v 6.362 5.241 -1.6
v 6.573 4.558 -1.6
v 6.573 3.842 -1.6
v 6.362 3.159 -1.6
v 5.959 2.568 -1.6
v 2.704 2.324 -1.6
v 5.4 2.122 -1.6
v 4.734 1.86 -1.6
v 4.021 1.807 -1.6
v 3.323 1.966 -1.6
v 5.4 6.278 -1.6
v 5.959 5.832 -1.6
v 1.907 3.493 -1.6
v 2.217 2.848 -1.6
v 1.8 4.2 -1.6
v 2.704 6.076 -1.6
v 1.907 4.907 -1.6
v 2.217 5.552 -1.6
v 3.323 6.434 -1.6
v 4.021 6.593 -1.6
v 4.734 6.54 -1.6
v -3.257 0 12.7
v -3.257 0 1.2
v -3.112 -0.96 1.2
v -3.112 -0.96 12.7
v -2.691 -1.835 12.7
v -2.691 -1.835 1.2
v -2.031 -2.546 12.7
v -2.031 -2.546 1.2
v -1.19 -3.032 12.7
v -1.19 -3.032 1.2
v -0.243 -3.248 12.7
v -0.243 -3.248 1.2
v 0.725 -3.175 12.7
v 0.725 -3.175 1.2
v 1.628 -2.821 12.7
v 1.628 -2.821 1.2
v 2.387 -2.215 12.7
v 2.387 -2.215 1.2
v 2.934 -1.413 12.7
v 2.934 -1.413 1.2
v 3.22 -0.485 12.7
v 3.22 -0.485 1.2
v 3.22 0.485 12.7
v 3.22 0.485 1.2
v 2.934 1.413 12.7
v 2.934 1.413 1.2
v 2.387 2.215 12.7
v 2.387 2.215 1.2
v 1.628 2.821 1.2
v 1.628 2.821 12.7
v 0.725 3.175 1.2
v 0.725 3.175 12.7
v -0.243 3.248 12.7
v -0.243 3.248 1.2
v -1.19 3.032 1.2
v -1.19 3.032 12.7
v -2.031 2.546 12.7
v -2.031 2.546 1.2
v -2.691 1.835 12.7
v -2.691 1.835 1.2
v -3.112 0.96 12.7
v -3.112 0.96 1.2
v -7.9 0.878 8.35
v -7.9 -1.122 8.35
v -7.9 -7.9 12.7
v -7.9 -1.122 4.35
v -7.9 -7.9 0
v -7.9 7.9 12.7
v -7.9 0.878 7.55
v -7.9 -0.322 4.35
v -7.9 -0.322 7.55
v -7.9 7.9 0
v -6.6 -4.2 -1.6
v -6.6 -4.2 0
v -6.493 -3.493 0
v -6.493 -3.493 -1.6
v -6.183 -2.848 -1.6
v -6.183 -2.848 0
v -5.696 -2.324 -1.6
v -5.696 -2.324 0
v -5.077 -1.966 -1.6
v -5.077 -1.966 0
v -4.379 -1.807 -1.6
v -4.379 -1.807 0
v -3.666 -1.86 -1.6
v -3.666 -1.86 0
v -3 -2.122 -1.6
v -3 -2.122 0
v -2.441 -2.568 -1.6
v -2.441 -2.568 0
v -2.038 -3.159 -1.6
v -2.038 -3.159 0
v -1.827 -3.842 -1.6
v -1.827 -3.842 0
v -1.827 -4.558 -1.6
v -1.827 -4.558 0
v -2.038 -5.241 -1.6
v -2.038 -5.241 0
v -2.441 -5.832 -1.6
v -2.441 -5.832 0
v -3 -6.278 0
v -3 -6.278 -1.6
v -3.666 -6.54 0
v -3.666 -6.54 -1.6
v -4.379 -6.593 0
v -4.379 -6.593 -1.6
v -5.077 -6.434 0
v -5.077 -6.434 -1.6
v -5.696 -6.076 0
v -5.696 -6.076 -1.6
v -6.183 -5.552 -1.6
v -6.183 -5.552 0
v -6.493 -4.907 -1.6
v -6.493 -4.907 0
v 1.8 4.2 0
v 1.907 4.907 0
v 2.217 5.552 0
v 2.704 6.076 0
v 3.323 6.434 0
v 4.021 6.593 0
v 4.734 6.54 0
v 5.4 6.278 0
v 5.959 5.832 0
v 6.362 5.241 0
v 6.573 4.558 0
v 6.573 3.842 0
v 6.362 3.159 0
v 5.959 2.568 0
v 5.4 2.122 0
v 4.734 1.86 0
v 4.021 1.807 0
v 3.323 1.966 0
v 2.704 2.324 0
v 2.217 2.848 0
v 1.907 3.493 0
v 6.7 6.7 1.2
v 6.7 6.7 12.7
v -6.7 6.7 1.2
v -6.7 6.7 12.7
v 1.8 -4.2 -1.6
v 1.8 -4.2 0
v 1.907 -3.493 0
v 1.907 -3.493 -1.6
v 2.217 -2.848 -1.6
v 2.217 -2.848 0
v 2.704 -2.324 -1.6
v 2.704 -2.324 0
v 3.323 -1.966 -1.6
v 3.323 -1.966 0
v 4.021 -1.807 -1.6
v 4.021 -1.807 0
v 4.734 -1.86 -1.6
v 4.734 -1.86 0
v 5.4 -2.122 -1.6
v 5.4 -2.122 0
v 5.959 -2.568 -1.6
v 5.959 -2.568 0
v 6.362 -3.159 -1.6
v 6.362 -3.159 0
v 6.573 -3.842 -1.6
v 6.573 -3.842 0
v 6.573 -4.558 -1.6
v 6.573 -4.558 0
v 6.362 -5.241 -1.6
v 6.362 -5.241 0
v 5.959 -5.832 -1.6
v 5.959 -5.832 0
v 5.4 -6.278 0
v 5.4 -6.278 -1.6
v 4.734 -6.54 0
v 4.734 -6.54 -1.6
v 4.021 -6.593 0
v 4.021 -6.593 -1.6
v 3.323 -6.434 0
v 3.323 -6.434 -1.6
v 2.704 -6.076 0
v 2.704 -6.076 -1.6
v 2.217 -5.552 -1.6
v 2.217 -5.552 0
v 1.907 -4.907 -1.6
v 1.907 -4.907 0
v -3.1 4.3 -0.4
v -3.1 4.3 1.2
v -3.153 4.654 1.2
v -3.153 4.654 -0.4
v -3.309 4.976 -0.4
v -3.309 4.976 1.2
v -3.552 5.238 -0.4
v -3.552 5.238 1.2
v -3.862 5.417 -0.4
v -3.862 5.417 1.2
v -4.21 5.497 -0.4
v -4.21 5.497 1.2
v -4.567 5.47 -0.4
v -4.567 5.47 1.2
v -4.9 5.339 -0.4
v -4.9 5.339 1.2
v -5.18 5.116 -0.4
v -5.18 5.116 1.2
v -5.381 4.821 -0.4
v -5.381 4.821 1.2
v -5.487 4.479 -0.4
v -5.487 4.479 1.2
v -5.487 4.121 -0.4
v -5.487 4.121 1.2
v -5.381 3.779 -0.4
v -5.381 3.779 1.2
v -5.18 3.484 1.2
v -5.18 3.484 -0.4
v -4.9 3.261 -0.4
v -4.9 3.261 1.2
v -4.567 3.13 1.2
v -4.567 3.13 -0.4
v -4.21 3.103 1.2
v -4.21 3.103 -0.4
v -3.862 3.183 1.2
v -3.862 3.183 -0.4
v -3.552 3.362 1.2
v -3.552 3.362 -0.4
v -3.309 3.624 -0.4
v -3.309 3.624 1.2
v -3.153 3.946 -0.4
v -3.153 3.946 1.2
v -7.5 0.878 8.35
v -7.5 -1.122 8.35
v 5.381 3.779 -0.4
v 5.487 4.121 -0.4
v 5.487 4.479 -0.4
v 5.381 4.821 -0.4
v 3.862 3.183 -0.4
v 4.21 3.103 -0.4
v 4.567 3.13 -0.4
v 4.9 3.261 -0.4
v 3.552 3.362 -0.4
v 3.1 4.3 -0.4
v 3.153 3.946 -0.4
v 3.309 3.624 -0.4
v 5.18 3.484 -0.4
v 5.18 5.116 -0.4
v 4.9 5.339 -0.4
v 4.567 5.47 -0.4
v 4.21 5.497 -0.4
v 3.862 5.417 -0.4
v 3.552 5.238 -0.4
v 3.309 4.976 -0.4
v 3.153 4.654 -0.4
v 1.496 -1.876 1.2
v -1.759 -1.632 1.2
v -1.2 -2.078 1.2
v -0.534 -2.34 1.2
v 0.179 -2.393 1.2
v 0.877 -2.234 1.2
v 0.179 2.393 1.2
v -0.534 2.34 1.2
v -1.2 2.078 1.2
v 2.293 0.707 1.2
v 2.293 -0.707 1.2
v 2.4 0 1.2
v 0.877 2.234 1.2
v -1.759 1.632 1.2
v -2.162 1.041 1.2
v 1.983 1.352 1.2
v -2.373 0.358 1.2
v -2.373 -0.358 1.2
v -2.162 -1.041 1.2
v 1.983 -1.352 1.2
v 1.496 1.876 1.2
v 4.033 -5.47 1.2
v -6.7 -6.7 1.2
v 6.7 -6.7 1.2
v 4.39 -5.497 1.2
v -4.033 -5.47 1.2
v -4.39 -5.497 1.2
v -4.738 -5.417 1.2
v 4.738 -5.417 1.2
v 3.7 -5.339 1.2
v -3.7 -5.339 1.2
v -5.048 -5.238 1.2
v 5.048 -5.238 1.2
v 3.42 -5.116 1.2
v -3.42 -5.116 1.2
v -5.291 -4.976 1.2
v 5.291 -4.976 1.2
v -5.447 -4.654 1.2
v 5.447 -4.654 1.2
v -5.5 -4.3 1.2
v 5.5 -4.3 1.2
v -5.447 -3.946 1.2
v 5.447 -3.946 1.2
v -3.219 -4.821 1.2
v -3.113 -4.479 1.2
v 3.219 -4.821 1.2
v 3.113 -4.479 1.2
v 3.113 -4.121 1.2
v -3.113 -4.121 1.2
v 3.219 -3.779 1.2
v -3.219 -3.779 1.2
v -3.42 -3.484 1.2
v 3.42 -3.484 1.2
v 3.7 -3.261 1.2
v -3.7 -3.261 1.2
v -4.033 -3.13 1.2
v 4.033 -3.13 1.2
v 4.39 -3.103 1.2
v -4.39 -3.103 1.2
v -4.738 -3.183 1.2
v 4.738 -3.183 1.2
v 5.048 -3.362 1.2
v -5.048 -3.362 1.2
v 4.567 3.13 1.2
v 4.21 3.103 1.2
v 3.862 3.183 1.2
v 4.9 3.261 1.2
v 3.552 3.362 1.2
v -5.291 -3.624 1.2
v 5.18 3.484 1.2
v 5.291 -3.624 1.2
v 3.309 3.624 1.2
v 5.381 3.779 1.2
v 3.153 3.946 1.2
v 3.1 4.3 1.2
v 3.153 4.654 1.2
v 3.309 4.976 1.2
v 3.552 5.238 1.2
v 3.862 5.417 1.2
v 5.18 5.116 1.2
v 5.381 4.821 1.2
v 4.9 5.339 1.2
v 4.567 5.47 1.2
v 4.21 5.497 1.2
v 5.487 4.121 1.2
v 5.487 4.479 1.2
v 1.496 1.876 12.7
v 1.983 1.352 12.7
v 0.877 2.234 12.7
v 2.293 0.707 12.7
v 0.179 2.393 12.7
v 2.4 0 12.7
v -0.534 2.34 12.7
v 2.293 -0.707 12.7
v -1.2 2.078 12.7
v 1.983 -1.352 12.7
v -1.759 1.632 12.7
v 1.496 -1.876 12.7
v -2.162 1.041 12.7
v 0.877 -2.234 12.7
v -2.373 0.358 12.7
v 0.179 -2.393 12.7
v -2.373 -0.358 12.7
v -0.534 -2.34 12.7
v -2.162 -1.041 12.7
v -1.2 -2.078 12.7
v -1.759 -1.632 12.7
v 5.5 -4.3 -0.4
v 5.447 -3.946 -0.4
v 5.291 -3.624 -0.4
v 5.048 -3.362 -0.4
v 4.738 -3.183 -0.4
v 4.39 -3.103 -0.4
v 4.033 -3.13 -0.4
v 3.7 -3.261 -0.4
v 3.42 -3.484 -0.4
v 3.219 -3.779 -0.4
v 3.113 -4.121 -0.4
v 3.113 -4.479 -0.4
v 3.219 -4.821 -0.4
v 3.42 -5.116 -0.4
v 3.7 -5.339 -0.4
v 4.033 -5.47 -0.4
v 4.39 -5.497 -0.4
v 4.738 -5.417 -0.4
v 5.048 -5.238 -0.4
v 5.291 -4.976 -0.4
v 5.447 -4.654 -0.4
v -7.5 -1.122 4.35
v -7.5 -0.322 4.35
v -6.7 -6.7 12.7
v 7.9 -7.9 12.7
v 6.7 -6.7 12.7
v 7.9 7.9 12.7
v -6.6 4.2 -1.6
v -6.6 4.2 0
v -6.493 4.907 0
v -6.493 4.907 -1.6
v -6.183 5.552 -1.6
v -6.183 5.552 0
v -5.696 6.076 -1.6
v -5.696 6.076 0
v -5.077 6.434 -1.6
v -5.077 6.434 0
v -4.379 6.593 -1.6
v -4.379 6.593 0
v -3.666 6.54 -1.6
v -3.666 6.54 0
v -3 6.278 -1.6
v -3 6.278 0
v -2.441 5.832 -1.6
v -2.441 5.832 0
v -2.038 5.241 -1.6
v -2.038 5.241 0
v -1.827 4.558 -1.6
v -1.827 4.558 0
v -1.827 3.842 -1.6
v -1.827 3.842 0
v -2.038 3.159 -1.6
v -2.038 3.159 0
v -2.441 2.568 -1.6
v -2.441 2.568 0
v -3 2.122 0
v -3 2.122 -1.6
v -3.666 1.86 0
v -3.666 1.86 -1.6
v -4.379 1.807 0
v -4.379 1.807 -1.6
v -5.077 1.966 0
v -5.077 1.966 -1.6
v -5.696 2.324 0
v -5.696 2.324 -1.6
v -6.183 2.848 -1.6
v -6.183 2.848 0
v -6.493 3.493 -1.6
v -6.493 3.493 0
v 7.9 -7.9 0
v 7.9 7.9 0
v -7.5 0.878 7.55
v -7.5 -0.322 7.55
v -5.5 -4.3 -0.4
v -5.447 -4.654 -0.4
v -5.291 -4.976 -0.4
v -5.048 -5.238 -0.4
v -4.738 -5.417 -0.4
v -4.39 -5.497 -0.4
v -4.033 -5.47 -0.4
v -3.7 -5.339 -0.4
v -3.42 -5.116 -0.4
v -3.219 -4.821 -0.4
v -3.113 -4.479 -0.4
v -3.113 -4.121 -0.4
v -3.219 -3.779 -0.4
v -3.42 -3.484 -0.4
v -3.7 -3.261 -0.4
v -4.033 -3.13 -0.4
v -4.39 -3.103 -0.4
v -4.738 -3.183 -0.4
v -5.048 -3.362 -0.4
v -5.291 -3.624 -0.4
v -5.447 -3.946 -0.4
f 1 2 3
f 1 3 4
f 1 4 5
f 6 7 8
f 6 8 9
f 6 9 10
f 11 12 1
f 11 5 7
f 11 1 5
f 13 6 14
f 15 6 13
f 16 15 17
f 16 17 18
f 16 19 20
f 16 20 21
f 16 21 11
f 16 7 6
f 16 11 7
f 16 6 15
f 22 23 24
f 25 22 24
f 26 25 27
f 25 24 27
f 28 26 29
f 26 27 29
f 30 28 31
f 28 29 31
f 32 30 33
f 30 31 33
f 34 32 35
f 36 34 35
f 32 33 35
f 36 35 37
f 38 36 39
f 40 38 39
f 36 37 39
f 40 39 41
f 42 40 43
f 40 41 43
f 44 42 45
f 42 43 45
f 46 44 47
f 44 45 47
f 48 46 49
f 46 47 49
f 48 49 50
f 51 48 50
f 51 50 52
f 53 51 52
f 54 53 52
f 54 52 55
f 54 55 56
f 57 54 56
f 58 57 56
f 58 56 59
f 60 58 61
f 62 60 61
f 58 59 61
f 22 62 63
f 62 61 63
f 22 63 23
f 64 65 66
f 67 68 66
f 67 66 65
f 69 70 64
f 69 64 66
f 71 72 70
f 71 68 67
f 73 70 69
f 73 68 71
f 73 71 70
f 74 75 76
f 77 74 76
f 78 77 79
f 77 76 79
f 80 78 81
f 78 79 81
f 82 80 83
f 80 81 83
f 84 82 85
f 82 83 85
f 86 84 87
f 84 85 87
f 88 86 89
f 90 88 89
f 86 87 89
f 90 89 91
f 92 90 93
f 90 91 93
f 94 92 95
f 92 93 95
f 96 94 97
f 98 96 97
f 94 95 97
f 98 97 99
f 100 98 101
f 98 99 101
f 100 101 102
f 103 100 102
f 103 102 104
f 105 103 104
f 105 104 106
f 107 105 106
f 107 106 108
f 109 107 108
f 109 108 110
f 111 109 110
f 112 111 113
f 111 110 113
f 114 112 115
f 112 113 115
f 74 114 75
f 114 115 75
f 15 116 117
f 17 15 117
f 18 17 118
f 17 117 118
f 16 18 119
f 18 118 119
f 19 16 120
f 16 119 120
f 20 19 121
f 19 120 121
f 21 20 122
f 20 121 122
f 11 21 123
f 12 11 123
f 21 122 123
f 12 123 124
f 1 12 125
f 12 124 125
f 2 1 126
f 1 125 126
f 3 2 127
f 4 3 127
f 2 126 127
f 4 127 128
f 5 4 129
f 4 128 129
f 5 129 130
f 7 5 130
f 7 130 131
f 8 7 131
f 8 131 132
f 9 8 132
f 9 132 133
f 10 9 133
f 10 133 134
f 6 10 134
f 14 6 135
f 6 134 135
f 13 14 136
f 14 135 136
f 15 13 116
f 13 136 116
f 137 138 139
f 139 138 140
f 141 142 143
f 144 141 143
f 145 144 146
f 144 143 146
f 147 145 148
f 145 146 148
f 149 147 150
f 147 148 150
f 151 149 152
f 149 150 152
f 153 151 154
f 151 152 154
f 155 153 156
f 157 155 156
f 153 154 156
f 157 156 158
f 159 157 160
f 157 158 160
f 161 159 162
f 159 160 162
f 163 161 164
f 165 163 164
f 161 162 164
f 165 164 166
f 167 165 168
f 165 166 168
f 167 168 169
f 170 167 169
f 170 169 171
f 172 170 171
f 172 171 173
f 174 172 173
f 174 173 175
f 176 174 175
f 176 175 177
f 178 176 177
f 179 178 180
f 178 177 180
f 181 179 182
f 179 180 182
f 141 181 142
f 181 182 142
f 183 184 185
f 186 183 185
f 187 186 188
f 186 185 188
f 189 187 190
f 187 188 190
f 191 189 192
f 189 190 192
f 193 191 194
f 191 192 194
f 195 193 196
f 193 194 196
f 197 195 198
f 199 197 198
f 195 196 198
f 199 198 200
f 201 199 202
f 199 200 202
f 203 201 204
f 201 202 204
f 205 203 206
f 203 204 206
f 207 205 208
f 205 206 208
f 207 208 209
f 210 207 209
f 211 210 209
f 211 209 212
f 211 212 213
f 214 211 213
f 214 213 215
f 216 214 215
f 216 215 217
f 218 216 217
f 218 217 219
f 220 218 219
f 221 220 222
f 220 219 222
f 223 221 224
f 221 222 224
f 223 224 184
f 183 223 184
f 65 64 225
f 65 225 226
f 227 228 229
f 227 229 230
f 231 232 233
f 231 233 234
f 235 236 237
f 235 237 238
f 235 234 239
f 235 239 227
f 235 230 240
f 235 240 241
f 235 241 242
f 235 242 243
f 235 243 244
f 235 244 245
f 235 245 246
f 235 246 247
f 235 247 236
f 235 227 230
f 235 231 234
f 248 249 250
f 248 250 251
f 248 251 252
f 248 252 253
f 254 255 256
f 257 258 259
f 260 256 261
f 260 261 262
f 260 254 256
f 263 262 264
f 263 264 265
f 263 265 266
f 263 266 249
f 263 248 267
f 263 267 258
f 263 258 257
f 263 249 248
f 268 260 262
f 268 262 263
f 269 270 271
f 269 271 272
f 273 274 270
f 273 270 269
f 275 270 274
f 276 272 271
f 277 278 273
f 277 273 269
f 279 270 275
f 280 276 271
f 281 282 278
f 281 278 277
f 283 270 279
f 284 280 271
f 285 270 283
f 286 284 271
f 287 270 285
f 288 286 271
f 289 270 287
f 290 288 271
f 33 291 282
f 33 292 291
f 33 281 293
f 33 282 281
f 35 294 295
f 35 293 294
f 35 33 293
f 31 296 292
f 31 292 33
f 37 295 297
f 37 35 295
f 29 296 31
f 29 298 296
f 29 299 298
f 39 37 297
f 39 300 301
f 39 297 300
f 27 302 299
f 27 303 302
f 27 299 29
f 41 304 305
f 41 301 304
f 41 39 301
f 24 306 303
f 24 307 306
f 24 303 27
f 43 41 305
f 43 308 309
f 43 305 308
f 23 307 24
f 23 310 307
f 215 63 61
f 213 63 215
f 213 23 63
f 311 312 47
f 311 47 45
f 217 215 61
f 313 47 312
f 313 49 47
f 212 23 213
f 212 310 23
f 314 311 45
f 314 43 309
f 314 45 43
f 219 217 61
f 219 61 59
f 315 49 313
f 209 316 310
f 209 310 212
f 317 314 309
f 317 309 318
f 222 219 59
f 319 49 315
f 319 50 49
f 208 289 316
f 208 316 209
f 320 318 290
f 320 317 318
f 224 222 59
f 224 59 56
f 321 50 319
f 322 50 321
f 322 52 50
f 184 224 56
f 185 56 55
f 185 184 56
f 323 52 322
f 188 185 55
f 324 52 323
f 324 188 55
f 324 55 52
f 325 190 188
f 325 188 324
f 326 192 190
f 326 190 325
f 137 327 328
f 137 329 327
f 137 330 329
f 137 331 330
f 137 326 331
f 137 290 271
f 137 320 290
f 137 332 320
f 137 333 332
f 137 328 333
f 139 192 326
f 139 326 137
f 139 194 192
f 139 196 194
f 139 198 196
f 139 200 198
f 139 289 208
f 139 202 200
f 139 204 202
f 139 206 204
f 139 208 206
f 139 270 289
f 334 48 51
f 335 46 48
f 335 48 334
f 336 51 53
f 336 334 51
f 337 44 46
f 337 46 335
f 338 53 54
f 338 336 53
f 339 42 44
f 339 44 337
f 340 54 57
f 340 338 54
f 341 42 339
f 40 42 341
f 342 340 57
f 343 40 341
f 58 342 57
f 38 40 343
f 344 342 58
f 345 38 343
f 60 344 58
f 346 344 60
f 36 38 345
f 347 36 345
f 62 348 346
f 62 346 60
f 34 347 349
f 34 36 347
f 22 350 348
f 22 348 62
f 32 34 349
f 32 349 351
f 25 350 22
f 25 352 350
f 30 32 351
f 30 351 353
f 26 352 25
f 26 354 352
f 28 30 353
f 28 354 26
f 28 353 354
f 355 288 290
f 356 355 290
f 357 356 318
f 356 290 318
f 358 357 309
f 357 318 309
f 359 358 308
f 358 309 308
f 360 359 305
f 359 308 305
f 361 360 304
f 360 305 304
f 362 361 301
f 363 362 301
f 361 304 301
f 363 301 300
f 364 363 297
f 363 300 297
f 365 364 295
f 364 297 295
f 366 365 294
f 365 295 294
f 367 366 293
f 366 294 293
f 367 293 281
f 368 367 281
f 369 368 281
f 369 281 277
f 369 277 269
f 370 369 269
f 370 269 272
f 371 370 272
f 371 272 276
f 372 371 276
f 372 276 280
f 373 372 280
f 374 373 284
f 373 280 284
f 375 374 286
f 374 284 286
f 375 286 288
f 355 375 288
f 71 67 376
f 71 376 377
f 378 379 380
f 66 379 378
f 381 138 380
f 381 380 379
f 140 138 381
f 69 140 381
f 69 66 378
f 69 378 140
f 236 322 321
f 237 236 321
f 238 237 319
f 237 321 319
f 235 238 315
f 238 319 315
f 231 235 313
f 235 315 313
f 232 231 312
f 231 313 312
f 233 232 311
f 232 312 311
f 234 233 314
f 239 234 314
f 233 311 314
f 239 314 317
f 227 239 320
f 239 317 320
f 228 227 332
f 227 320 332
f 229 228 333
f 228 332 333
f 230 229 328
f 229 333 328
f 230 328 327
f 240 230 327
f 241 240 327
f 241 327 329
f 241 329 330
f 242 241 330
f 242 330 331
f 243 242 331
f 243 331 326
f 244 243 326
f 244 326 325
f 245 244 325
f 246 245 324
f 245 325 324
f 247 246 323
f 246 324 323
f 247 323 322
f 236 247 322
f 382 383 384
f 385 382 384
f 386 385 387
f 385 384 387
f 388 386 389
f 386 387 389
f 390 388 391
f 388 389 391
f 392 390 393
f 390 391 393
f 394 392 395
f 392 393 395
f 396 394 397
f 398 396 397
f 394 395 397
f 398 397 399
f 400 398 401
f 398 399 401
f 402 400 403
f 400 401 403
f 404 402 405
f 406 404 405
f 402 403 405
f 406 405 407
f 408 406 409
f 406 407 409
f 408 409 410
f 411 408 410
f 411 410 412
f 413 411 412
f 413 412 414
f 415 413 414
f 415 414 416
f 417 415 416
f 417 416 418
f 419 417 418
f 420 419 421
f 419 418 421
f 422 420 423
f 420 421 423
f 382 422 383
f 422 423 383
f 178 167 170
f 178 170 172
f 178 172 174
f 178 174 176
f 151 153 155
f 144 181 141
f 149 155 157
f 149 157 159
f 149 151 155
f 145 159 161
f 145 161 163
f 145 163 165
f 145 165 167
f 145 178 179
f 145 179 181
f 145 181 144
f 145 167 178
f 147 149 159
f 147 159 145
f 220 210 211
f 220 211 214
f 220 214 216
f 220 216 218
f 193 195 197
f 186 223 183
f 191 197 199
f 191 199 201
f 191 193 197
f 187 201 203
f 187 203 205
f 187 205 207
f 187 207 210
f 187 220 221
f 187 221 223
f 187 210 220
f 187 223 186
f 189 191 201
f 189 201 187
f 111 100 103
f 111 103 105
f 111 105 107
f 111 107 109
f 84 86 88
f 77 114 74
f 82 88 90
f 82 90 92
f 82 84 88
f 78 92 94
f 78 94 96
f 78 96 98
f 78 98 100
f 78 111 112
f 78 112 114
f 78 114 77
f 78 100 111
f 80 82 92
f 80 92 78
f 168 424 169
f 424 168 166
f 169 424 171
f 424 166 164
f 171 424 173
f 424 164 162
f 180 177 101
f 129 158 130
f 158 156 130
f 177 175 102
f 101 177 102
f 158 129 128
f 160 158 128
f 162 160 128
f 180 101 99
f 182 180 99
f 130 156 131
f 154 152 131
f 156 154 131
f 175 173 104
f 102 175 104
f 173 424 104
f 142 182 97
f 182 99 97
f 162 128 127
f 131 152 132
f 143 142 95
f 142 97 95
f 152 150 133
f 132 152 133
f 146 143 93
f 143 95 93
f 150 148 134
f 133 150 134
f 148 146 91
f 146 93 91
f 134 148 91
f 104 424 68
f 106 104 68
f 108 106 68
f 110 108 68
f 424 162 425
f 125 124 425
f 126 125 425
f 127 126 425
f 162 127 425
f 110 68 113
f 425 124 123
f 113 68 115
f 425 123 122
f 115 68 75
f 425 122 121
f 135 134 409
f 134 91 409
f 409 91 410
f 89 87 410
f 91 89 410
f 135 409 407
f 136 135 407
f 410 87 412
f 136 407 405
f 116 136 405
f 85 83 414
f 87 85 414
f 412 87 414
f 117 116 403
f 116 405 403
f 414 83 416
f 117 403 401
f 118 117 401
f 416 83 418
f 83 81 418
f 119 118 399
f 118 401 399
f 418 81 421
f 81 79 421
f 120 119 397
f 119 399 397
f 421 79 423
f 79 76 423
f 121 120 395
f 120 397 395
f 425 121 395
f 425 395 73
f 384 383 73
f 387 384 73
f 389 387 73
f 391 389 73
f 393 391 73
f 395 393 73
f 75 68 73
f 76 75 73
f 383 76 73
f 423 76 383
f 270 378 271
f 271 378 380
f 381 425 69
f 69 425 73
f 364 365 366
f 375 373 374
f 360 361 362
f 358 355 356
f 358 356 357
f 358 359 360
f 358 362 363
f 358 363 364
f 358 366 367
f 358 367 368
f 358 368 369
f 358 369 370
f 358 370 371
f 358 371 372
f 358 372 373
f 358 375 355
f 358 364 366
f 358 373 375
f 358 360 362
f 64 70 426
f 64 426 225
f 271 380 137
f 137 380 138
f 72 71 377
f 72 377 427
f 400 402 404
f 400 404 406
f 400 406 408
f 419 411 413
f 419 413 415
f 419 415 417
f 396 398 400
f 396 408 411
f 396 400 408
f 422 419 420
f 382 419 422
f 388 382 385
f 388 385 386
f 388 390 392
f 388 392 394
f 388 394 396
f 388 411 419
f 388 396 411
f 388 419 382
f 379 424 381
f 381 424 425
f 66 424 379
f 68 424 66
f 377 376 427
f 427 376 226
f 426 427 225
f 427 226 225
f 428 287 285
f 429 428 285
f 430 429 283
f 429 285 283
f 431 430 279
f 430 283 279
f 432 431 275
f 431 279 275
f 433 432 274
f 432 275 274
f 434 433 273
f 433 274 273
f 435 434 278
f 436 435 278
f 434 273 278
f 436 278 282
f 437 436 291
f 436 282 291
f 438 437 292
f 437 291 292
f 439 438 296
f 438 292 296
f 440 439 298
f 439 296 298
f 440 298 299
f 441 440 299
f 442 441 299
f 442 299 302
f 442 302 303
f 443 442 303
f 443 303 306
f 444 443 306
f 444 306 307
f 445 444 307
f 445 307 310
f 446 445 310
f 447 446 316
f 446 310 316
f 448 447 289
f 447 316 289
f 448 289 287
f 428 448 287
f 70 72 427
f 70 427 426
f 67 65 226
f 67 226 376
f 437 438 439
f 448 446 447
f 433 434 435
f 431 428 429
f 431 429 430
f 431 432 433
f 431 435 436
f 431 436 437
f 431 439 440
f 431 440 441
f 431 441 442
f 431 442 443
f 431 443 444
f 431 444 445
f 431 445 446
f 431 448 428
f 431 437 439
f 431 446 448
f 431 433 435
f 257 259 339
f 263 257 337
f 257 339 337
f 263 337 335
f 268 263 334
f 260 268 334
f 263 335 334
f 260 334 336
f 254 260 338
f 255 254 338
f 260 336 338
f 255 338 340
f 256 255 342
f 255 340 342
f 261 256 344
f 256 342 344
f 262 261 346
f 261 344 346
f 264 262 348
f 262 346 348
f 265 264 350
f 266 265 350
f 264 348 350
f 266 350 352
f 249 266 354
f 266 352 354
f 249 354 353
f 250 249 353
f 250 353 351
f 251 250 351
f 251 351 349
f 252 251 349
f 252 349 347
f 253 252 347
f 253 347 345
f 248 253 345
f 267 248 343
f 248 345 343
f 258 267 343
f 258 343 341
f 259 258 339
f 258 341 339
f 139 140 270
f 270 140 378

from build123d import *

# Parameters (mm, degrees)
SKETCH2_W           = 15.8
SKETCH2_H           = 15.8
BOSS_EXTRUDE1_DEPTH = 12.7
CUT_EXTRUDE1_DEPTH  = 11.49999986
SKETCH5_R           = 3.256854249
BOSS_EXTRUDE3_DEPTH = 11.5
SKETCH6_R           = 2.4
CUT_EXTRUDE2_DEPTH  = 11.5
SKETCH4_R           = 2.4
BOSS_EXTRUDE4_DEPTH = 1.6
SKETCH7_R           = 1.2
CUT_EXTRUDE3_DEPTH  = 1.6
CUT_EXTRUDE4_DEPTH  = 0.4


with BuildPart() as part:
    # Sketch2 → Boss-Extrude1 (new body)
    with BuildSketch(Plane(origin=(0, 0, 0), x_dir=(0, 1, 0), z_dir=(0, 0, 1))):
        Rectangle(SKETCH2_W, SKETCH2_H)
    extrude(amount=BOSS_EXTRUDE1_DEPTH)

    # 3DSketch1 → Cut-Extrude1 (cut)
    with BuildSketch(Plane(origin=(-6.7, -6.7, 12.7), x_dir=(0.7071067811865477, 0.7071067811865474, 0), z_dir=(0, 0, 1))):
        Polygon((0, 0), (9.475230868, -9.475230868), (18.950461736, 0), (9.475230868, 9.475230868), align=None)
    extrude(amount=-CUT_EXTRUDE1_DEPTH, mode=Mode.SUBTRACT)

    # Sketch5 → Boss-Extrude3 (add)
    with BuildSketch(Plane.XY.offset(1.20000014)):
        with Locations(Location((0, 0, 0), (0, 0, 180))):
            Circle(SKETCH5_R)
    extrude(amount=BOSS_EXTRUDE3_DEPTH)

    # Sketch6 → Cut-Extrude2 (cut)
    with BuildSketch(Plane.XY.offset(12.70000014)):
        Circle(SKETCH6_R)
    extrude(amount=-CUT_EXTRUDE2_DEPTH, mode=Mode.SUBTRACT)

    # Sketch4 → Boss-Extrude4 (add)
    with BuildSketch(Plane(origin=(0, 0, 0), x_dir=(1, 0, 0), z_dir=(0, 0, -1))):
        with Locations(Location((-4.2, 4.2, 0), (0, 0, 180))):
            Circle(SKETCH4_R)
        with Locations(Location((4.2, 4.2, 0), (0, 0, 180))):
            Circle(SKETCH4_R)
        with Locations(Location((-4.2, -4.2, 0), (0, 0, 180))):
            Circle(SKETCH4_R)
        with Locations(Location((4.2, -4.2, 0), (0, 0, 180))):
            Circle(SKETCH4_R)
    extrude(amount=BOSS_EXTRUDE4_DEPTH)

    # Sketch7 → Cut-Extrude3 (cut)
    with BuildSketch(Plane.XY.offset(1.20000014)):
        with Locations((-4.3, 4.3)):
            Circle(SKETCH7_R)
        with Locations(Location((4.3, 4.3, 0), (0, 0, 180))):
            Circle(SKETCH7_R)
        with Locations((4.3, -4.3)):
            Circle(SKETCH7_R)
        with Locations(Location((-4.3, -4.3, 0), (0, 0, 180))):
            Circle(SKETCH7_R)
    extrude(amount=-CUT_EXTRUDE3_DEPTH, mode=Mode.SUBTRACT)

    # Sketch8 → Cut-Extrude4 (cut)
    with BuildSketch(Plane(origin=(-7.9, 0, 0), x_dir=(0, -1, 0), z_dir=(-1, 0, 0))):
        Polygon((0.322443159, 4.35), (0.322443159, 7.55), (-0.877556841, 7.55), (-0.877556841, 8.35), (1.122443159, 8.35), (1.122443159, 4.35), align=None)
    extrude(amount=-CUT_EXTRUDE4_DEPTH, mode=Mode.SUBTRACT)


solid = part.part
